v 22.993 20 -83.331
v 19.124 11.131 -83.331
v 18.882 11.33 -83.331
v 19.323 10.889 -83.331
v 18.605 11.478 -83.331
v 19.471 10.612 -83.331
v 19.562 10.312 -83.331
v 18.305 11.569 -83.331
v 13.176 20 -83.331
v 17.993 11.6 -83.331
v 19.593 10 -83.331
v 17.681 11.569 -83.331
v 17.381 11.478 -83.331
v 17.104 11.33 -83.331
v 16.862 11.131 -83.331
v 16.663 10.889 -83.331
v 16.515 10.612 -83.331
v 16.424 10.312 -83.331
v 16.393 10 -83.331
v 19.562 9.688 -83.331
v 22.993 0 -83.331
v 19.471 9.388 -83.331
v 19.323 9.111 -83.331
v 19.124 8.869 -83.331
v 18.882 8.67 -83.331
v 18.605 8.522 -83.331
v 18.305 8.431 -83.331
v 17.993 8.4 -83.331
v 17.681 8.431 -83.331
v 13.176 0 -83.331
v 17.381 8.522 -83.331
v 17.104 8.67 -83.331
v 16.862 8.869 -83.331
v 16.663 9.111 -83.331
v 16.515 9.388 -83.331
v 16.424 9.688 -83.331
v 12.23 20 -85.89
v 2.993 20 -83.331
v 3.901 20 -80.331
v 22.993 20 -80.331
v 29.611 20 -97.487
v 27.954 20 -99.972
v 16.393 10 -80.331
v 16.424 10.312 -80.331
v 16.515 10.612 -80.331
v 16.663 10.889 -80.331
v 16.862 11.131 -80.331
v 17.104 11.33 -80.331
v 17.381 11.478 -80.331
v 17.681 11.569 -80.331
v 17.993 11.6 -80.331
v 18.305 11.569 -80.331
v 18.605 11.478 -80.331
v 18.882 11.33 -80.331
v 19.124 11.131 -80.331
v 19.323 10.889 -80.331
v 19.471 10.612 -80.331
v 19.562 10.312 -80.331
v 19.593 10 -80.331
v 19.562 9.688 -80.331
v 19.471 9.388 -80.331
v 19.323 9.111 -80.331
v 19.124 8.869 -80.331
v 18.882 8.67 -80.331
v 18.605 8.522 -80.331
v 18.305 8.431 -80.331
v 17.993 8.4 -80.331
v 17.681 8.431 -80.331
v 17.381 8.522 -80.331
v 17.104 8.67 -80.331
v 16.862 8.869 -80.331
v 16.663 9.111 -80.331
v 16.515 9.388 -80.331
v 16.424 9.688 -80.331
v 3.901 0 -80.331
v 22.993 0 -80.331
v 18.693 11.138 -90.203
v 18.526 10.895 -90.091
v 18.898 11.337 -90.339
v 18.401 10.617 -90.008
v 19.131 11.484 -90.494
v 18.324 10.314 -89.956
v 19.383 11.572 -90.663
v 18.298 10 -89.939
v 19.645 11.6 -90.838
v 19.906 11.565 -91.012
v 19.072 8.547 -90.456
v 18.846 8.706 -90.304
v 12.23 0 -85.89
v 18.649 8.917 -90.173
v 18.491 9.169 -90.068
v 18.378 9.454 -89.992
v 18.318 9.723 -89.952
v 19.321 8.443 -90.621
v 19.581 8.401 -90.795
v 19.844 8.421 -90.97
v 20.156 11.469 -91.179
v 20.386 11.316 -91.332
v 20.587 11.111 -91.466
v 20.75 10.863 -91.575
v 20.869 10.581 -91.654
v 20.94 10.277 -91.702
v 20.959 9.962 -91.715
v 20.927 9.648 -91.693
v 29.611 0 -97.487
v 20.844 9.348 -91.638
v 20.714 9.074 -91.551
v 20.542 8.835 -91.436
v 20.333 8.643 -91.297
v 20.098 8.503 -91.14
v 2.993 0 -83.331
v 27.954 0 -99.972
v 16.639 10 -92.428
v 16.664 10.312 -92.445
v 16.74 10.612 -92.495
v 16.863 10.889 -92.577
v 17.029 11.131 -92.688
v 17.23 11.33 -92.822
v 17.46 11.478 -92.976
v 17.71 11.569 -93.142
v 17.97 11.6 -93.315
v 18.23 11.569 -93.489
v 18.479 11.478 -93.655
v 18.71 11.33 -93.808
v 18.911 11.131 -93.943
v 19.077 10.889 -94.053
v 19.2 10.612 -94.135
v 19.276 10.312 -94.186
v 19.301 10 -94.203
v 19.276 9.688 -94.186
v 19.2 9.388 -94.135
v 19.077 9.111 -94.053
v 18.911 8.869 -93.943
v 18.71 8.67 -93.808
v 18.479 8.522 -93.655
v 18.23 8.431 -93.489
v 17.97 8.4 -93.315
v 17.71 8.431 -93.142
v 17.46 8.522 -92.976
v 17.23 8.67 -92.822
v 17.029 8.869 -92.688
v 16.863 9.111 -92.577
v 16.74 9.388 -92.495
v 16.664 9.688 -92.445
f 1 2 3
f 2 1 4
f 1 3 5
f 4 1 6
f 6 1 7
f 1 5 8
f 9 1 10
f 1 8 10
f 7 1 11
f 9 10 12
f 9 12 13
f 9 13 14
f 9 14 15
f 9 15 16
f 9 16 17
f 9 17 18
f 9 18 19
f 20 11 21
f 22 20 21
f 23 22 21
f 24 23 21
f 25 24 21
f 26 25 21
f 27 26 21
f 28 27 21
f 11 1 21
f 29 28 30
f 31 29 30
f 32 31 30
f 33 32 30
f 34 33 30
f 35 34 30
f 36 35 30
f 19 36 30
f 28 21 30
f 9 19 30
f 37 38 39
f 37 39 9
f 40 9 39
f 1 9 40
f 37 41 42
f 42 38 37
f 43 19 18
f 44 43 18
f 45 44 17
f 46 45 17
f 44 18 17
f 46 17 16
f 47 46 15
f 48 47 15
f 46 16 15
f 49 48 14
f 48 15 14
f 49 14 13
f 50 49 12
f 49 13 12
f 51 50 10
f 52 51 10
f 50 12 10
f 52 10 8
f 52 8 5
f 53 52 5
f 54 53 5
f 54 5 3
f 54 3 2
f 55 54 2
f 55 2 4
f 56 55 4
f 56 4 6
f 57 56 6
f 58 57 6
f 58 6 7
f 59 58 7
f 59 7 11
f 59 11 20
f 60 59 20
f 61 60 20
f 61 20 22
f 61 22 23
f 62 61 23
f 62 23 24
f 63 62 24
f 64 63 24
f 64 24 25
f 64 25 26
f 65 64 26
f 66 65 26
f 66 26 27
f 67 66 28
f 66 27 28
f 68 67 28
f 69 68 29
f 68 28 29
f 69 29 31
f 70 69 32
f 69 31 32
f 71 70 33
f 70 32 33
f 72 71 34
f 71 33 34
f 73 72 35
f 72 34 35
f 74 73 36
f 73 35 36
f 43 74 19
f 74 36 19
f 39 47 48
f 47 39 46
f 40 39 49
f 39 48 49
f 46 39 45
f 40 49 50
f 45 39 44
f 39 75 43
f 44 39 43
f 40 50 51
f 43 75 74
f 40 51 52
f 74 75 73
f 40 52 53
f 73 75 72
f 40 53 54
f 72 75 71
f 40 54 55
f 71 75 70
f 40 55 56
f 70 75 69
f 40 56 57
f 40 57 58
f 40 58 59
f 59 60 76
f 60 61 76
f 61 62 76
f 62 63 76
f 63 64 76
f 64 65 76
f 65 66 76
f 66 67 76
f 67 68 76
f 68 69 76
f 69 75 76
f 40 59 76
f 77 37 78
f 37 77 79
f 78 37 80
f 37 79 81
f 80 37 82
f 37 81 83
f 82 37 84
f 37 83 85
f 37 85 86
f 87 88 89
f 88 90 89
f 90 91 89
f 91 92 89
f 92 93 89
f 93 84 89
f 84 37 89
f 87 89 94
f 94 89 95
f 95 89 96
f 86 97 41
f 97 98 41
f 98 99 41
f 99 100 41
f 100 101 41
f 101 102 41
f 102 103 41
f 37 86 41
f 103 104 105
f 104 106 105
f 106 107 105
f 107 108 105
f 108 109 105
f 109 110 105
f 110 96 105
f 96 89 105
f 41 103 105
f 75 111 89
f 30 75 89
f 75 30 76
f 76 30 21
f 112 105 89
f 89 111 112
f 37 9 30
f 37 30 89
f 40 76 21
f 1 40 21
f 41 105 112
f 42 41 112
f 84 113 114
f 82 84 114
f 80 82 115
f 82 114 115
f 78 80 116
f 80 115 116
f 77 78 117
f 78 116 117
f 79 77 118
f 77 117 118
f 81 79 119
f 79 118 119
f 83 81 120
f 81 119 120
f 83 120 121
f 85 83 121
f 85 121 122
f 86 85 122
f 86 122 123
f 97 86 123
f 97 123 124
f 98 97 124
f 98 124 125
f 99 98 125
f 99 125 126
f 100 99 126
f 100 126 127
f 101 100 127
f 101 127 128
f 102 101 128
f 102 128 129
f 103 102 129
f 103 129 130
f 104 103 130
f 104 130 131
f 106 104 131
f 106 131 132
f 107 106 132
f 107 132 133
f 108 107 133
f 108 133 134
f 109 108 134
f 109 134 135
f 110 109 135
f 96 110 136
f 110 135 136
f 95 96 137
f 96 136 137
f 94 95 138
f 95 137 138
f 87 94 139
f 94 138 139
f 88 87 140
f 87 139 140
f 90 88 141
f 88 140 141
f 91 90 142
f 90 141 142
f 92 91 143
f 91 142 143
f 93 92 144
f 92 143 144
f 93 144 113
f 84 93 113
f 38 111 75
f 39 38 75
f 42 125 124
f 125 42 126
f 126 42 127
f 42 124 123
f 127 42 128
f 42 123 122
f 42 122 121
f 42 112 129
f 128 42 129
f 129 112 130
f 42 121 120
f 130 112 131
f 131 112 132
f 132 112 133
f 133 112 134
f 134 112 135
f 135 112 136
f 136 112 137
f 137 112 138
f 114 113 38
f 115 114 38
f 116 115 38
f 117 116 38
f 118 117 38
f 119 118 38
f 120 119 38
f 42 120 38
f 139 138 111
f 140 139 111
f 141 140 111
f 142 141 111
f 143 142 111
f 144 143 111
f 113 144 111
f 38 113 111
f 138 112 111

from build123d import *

# Parameters (mm, degrees)
EXTRUDE_1_DEPTH     = 20
SKETCH_4_R          = 1.6
CUT_EXTRUDE_1_DEPTH = 4
CUT_EXTRUDE_2_REACH = 19.261
SKETCH_5_R          = 1.6


with BuildPart() as part:
    # 草图1 → 凸台-拉伸1 (new body)
    with BuildSketch(Plane(origin=(0, 0, 0), x_dir=(1, 0, 0), z_dir=(0, 1, 0))):
        Polygon((3.90131241, 80.330794947), (22.992985496, 80.330794947), (22.992985496, 83.330794947), (13.176134515, 83.330794947), (12.229840324, 85.890335427), (29.611004769, 97.487035171), (27.954494327, 99.971800834), (2.992985496, 83.330794947), align=None)
    extrude(amount=EXTRUDE_1_DEPTH)

    # 草图4 → 切除-拉伸1 (cut, through all)
    with BuildSketch(Plane(origin=(0, 0, -83.330794947), x_dir=(-1, 0, 0), z_dir=(0, 0, -1))):
        with Locations((-17.992985496, 10)):
            Circle(SKETCH_4_R)
    extrude(amount=-CUT_EXTRUDE_1_DEPTH, mode=Mode.SUBTRACT)

    # 草图5 → 切除-拉伸2 (cut, up to next)
    with BuildSketch(Plane(origin=(-37.539448284, 0, -56.309172427), x_dir=(-0.832050294, 0, 0.554700196), z_dir=(-0.554700196, 0, -0.832050294)), mode=Mode.PRIVATE) as cut_extrude_2_sk1:
        with Locations((-66.713922772, 10)):
            Circle(SKETCH_5_R)
    cut_extrude_2_tool1 = extrude(cut_extrude_2_sk1.sketch, amount=-CUT_EXTRUDE_2_REACH, mode=Mode.PRIVATE) & part.part
    add(cut_extrude_2_tool1.solids().sort_by_distance((17.969891, 10, -93.315398))[0], mode=Mode.SUBTRACT)


solid = part.part
